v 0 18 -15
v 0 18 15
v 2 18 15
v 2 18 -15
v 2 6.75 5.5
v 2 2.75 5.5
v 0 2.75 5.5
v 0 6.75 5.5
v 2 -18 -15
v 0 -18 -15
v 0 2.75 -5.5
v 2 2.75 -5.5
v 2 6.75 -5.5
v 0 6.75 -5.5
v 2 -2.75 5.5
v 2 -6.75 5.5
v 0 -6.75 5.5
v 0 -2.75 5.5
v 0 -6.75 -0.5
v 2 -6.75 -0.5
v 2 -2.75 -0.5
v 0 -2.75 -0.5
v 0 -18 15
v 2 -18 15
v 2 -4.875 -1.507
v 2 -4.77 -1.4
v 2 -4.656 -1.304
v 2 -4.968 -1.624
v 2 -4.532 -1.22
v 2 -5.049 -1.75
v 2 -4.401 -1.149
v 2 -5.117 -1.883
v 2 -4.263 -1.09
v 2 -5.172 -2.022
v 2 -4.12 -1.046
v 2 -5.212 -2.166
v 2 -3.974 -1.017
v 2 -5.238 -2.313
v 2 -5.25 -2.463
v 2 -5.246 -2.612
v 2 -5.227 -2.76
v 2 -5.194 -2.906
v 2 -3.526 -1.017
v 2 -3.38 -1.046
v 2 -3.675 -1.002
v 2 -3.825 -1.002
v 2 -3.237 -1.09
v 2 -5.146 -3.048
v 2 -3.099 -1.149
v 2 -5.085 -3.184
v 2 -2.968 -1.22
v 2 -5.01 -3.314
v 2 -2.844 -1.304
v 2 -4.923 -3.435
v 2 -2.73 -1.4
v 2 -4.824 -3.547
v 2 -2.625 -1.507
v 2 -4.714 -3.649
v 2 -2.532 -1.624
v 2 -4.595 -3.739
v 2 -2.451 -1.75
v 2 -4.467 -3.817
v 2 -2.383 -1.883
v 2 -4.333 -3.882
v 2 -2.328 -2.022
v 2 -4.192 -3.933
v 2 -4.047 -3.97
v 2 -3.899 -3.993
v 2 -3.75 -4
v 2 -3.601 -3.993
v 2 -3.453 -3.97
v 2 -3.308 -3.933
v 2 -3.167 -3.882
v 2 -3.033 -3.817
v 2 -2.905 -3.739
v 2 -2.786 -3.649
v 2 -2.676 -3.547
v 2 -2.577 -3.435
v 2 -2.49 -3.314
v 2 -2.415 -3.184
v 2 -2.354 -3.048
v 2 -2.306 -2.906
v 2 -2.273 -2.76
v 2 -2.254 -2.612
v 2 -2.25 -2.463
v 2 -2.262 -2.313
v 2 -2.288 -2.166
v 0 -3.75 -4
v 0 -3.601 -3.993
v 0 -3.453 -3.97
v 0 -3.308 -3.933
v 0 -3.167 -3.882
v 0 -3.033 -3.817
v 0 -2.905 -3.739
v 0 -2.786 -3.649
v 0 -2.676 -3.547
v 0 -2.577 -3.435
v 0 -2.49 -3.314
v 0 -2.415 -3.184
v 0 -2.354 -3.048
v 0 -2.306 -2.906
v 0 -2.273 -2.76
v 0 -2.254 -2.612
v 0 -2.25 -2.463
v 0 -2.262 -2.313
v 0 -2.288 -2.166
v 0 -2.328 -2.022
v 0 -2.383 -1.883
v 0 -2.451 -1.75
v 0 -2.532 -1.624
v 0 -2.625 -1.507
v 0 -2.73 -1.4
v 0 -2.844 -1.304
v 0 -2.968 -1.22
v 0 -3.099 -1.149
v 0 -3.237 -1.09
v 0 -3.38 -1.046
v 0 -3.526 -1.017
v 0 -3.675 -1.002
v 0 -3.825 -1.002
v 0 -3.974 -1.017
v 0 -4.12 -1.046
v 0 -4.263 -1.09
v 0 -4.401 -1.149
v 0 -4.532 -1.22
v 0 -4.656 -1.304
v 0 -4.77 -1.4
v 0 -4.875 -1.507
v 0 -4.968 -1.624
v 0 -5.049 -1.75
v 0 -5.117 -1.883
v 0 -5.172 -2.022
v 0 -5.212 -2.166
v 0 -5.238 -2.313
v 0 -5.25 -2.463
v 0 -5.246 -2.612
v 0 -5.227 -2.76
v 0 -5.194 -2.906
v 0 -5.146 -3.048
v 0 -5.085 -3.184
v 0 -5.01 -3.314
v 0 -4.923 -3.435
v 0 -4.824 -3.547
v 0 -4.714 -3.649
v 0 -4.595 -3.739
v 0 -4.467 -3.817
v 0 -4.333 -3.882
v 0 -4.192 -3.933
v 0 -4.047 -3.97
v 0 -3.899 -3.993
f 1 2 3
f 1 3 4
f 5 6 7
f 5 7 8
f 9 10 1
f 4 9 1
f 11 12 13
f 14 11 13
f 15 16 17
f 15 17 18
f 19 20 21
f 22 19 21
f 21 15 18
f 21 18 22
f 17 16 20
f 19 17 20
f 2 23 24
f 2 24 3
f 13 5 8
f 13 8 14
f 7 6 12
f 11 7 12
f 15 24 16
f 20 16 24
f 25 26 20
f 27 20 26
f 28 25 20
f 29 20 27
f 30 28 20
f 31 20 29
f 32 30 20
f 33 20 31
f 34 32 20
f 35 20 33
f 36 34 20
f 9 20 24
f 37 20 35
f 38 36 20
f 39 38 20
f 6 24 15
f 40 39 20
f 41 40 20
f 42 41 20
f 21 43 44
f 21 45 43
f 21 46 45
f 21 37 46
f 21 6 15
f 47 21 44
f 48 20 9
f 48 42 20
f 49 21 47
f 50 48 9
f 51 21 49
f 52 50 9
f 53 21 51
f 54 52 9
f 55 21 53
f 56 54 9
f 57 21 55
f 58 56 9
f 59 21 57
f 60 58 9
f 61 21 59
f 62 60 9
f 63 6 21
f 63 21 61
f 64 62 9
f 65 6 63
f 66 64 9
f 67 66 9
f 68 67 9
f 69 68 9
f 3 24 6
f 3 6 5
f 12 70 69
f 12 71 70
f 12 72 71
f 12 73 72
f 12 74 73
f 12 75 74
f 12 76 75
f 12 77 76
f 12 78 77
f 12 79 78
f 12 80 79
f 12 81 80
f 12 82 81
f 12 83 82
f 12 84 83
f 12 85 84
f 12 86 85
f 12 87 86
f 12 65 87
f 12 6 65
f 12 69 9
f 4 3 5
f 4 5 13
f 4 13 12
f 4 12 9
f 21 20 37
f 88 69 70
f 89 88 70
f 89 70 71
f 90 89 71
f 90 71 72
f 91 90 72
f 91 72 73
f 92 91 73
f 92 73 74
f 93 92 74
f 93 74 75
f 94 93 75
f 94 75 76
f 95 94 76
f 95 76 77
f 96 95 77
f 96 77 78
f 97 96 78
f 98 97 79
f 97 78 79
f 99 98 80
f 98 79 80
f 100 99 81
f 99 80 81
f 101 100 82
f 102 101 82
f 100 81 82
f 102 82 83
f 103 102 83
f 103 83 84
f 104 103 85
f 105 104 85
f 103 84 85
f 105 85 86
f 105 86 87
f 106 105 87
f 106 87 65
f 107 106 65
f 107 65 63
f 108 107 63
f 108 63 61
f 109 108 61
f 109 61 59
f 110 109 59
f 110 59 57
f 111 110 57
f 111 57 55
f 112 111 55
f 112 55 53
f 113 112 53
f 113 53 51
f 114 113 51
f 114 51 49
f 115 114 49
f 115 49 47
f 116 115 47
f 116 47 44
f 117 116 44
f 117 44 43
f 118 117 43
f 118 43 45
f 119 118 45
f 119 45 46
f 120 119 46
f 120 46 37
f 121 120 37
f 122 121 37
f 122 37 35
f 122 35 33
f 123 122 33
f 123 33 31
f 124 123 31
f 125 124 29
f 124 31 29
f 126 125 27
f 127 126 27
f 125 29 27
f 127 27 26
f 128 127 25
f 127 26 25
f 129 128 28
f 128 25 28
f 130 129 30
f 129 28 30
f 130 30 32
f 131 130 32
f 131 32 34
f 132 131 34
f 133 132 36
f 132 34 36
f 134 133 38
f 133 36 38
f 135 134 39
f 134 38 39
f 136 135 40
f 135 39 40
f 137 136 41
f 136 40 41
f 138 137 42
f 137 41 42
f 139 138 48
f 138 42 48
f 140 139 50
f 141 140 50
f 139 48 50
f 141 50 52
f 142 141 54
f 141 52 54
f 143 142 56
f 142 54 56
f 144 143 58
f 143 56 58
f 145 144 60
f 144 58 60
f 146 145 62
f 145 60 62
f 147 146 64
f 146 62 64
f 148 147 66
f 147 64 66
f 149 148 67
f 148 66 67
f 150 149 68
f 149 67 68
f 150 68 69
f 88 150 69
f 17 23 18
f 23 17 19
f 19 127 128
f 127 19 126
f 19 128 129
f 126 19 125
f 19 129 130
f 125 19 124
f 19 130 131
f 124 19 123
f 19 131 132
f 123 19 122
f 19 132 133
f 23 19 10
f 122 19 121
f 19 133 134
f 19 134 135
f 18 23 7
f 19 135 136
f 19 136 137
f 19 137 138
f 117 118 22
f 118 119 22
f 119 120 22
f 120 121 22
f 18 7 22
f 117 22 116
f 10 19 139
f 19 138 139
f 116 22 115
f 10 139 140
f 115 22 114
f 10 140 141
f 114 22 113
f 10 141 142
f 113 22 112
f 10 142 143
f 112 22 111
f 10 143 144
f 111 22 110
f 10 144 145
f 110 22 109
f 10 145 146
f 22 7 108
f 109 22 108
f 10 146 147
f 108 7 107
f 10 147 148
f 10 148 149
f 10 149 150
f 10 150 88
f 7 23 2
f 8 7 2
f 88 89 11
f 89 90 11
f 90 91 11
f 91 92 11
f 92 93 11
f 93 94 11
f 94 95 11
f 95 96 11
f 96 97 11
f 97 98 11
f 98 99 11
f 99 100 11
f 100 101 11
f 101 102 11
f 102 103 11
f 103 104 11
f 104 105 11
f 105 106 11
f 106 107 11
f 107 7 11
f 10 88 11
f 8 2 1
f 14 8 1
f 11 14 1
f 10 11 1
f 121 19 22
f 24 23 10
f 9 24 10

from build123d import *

# Parameters (mm, degrees)
SKETCH1_W           = 30
SKETCH1_H           = 36
BOSS_EXTRUDE1_DEPTH = 2
SKETCH2_W           = 11
SKETCH2_H           = 4
SKETCH2_W_2         = 6
SKETCH2_R           = 1.5
CUT_EXTRUDE2_DEPTH  = 10


with BuildPart() as part:
    # Sketch1 → Boss-Extrude1 (new body)
    with BuildSketch(Plane(origin=(0, 0, 0), x_dir=(0, 0, -1), z_dir=(1, 0, 0))):
        Rectangle(SKETCH1_W, SKETCH1_H)
    extrude(amount=BOSS_EXTRUDE1_DEPTH)

    # Sketch2 → Cut-Extrude2 (cut)
    with BuildSketch(Plane(origin=(2, 0, 0), x_dir=(0, 0, -1), z_dir=(1, 0, 0))):
        with Locations((0, 4.75)):
            Rectangle(SKETCH2_W, SKETCH2_H)
        with Locations((-2.5, -4.75)):
            Rectangle(SKETCH2_W_2, SKETCH2_H)
        with Locations((2.5, -3.75)):
            Circle(SKETCH2_R)
    extrude(amount=-CUT_EXTRUDE2_DEPTH, mode=Mode.SUBTRACT)


solid = part.part
